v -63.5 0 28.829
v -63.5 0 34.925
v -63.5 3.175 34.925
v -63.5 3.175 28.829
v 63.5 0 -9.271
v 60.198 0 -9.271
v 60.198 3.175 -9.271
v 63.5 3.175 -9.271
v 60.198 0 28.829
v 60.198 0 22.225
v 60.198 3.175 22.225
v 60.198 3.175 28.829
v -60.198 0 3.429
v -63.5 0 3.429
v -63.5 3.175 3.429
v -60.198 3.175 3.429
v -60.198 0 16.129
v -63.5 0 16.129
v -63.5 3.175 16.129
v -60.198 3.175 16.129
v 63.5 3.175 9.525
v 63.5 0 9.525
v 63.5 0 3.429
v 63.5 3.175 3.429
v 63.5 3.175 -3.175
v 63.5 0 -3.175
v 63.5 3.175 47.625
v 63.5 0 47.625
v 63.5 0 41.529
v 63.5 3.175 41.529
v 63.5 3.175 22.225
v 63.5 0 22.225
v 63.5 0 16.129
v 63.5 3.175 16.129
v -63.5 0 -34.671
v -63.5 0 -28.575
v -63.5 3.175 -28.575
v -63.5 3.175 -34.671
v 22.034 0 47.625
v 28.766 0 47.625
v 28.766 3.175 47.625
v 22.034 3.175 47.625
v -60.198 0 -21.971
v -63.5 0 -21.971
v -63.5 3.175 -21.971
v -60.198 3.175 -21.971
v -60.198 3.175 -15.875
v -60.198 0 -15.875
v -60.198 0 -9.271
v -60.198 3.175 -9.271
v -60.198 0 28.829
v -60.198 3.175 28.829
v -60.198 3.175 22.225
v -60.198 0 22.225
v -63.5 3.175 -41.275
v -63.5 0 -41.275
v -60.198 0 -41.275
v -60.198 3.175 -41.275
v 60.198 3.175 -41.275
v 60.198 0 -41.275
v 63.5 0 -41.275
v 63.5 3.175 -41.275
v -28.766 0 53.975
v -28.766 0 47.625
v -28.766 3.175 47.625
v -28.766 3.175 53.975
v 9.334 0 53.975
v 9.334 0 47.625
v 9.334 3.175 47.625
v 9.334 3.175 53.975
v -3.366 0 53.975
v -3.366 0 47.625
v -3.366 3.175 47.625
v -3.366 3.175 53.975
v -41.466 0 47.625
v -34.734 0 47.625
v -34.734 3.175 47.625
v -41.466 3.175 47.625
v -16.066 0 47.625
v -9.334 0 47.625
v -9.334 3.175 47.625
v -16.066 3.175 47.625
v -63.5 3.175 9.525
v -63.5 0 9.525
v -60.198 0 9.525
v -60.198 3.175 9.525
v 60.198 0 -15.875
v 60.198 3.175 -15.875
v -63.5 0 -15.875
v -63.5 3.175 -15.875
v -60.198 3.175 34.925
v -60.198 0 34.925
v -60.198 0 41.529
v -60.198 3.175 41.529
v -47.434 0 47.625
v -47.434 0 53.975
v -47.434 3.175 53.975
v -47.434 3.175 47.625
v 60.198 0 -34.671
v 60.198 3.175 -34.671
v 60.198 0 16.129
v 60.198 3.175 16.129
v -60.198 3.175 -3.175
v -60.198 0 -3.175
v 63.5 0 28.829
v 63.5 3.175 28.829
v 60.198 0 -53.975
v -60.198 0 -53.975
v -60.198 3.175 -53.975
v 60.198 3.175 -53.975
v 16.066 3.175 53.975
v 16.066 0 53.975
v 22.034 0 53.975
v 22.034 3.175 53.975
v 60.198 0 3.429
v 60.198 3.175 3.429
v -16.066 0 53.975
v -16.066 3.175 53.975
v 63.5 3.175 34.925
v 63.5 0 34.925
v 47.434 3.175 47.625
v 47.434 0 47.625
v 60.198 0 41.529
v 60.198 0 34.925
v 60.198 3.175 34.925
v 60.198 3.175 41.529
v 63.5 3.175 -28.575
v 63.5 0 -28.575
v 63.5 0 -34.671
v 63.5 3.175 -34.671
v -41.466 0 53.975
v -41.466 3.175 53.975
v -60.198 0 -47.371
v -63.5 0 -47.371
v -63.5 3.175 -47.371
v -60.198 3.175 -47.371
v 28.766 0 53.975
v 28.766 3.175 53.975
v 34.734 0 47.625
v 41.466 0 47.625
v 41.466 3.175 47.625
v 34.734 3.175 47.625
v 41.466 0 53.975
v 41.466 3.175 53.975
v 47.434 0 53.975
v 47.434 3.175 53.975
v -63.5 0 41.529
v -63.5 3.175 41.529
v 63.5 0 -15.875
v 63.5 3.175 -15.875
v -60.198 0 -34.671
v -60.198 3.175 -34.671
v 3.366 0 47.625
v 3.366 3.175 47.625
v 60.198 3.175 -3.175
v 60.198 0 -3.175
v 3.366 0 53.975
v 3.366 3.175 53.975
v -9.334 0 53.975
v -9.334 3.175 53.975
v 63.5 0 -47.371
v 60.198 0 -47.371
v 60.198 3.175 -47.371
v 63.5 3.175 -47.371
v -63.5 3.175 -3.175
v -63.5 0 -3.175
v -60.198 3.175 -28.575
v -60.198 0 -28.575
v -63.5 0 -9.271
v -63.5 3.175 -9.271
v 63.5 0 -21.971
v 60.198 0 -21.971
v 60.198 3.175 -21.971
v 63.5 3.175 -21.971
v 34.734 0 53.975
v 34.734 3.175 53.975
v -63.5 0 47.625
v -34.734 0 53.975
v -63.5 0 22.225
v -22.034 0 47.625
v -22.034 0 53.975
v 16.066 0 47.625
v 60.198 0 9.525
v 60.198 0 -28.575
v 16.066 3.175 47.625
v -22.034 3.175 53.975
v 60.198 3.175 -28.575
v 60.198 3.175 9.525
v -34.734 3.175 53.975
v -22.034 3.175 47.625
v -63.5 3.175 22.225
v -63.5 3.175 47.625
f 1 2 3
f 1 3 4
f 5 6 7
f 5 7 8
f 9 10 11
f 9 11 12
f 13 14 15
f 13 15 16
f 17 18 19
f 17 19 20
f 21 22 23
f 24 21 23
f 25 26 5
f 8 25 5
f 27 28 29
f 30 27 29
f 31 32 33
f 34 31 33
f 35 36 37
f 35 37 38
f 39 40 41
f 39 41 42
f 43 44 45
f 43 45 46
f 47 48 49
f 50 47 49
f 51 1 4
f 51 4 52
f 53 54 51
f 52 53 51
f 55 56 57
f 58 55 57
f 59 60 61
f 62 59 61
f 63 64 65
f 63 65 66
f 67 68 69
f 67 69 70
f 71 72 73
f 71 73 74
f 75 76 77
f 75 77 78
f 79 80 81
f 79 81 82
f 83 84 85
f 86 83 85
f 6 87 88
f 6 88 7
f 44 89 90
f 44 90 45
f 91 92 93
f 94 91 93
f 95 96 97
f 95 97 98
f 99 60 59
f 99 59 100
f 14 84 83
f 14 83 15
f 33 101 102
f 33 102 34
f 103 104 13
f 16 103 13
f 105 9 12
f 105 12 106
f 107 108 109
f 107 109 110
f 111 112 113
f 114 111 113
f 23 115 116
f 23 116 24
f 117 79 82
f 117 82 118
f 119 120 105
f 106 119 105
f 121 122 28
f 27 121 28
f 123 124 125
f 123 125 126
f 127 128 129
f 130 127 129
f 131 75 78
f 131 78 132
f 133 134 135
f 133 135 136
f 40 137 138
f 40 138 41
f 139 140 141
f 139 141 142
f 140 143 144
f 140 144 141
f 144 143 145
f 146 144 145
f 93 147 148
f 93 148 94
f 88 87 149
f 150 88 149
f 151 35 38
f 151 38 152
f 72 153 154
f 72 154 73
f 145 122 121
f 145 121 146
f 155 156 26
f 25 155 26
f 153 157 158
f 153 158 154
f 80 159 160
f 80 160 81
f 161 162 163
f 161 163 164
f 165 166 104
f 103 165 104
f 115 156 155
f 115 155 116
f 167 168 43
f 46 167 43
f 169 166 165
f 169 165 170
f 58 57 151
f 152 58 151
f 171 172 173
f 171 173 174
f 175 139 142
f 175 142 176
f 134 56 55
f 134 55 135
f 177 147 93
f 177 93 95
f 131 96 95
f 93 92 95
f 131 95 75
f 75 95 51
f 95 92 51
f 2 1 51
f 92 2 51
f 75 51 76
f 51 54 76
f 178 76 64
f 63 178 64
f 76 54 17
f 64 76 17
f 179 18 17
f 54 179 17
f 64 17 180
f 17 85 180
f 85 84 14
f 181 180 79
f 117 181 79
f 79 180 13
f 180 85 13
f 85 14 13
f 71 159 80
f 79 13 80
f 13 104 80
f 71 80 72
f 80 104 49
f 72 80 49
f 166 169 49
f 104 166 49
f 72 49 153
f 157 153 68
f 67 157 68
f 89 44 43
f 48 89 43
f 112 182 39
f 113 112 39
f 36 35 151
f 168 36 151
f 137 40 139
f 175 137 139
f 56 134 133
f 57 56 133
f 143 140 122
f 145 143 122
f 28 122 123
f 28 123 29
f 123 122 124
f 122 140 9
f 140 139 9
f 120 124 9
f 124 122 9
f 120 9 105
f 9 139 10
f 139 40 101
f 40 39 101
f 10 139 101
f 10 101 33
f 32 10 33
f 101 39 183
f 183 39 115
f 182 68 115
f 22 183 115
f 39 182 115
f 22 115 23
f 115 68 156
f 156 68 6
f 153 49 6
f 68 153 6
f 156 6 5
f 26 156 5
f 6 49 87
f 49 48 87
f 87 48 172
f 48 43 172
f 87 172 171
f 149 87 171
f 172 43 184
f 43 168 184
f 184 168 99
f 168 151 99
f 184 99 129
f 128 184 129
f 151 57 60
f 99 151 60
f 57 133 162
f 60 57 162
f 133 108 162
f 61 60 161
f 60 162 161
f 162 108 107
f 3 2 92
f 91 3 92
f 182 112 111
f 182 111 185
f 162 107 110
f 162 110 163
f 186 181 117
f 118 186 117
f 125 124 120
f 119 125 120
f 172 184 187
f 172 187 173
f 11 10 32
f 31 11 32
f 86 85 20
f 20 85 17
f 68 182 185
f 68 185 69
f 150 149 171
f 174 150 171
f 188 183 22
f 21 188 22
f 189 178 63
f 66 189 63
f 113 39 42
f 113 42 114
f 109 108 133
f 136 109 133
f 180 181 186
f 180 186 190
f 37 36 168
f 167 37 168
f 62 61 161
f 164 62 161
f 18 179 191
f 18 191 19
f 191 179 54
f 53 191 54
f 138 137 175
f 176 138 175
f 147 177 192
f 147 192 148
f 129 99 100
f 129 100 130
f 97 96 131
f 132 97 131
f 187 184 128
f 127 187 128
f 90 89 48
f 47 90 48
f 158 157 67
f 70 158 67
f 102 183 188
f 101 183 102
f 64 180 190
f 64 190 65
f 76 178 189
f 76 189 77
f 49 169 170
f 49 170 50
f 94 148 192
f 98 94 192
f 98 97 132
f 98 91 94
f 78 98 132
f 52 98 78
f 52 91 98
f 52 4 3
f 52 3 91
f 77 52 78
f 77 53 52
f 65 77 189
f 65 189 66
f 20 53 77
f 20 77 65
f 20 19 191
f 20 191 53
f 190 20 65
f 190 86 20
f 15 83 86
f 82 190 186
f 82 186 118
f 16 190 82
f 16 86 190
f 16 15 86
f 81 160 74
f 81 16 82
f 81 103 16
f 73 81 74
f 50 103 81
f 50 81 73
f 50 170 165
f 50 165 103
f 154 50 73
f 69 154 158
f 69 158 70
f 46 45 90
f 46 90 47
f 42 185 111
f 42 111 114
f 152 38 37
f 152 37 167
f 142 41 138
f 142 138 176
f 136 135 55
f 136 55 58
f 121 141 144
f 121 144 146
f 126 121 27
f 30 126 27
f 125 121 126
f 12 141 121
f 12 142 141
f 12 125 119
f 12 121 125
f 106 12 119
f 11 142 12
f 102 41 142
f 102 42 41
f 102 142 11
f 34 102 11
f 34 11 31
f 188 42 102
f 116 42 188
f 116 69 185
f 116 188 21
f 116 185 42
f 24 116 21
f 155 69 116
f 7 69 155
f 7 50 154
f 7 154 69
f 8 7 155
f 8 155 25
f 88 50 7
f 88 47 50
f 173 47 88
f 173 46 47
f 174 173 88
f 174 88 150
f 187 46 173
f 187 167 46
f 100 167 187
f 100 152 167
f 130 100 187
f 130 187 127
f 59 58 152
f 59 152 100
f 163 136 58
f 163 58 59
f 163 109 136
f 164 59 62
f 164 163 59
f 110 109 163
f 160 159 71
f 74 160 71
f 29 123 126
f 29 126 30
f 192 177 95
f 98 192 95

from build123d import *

# Parameters (mm, degrees)
SKETCH1_W           = 127
SKETCH1_H           = 107.95
BOSS_EXTRUDE1_DEPTH = 3.175
SKETCH2_W           = 3.302
SKETCH2_H           = 6.604
CUT_EXTRUDE1_DEPTH  = 84.400427157


with BuildPart() as part:
    # Sketch1 → Boss-Extrude1 (new body)
    with BuildSketch(Plane(origin=(0, 0, 0), x_dir=(1, 0, 0), z_dir=(0, 1, 0))):
        Rectangle(SKETCH1_W, SKETCH1_H)
    extrude(amount=BOSS_EXTRUDE1_DEPTH)

    # Sketch2 → Cut-Extrude1 (cut, through all)
    with BuildSketch(Plane.XZ):
        Polygon((-34.7345, 47.625), (-41.4655, 47.625), (-41.4655, 54.229), (-47.4345, 54.229), (-47.4345, 47.625), (-60.198, 47.625), (-63.5, 47.625), (-63.5, 54.229), (-63.5, 63.03162391), (63.5, 63.03162391), (63.5, 54.229), (63.5, 47.625), (60.198, 47.625), (47.4345, 47.625), (47.4345, 54.229), (41.4655, 54.229), (41.4655, 47.625), (34.7345, 47.625), (34.7345, 54.229), (28.7655, 54.229), (28.7655, 47.625), (22.0345, 47.625), (22.0345, 54.229), (16.0655, 54.229), (16.0655, 47.625), (9.3345, 47.625), (9.3345, 54.229), (3.3655, 54.229), (3.3655, 47.625), (-3.3655, 47.625), (-3.3655, 54.229), (-9.3345, 54.229), (-9.3345, 47.625), (-16.0655, 47.625), (-16.0655, 54.229), (-22.0345, 54.229), (-22.0345, 47.625), (-28.7655, 47.625), (-28.7655, 54.229), (-34.7345, 54.229), align=None)
        with Locations((61.849, 38.227)):
            Rectangle(SKETCH2_W, SKETCH2_H)
        with Locations((61.849, 25.527)):
            Rectangle(SKETCH2_W, SKETCH2_H)
        with Locations((61.849, 12.827)):
            Rectangle(SKETCH2_W, SKETCH2_H)
        with Locations((61.849, 0.127)):
            Rectangle(SKETCH2_W, SKETCH2_H)
        with Locations((61.849, -12.573)):
            Rectangle(SKETCH2_W, SKETCH2_H)
        with Locations((61.849, -25.273)):
            Rectangle(SKETCH2_W, SKETCH2_H)
        with Locations((61.849, -37.973)):
            Rectangle(SKETCH2_W, SKETCH2_H)
        with Locations((-61.849, -37.973)):
            Rectangle(SKETCH2_W, SKETCH2_H)
        with Locations((-61.849, -25.273)):
            Rectangle(SKETCH2_W, SKETCH2_H)
        with Locations((-61.849, -12.573)):
            Rectangle(SKETCH2_W, SKETCH2_H)
        with Locations((-61.849, 0.127)):
            Rectangle(SKETCH2_W, SKETCH2_H)
        with Locations((-61.849, 12.827)):
            Rectangle(SKETCH2_W, SKETCH2_H)
        with Locations((-61.849, 25.527)):
            Rectangle(SKETCH2_W, SKETCH2_H)
        with Locations((-61.849, 38.227)):
            Rectangle(SKETCH2_W, SKETCH2_H)
        with Locations((61.849, -50.673)):
            Rectangle(SKETCH2_W, SKETCH2_H)
        with Locations((-61.849, -50.673)):
            Rectangle(SKETCH2_W, SKETCH2_H)
    extrude(amount=-CUT_EXTRUDE1_DEPTH, mode=Mode.SUBTRACT)


solid = part.part
